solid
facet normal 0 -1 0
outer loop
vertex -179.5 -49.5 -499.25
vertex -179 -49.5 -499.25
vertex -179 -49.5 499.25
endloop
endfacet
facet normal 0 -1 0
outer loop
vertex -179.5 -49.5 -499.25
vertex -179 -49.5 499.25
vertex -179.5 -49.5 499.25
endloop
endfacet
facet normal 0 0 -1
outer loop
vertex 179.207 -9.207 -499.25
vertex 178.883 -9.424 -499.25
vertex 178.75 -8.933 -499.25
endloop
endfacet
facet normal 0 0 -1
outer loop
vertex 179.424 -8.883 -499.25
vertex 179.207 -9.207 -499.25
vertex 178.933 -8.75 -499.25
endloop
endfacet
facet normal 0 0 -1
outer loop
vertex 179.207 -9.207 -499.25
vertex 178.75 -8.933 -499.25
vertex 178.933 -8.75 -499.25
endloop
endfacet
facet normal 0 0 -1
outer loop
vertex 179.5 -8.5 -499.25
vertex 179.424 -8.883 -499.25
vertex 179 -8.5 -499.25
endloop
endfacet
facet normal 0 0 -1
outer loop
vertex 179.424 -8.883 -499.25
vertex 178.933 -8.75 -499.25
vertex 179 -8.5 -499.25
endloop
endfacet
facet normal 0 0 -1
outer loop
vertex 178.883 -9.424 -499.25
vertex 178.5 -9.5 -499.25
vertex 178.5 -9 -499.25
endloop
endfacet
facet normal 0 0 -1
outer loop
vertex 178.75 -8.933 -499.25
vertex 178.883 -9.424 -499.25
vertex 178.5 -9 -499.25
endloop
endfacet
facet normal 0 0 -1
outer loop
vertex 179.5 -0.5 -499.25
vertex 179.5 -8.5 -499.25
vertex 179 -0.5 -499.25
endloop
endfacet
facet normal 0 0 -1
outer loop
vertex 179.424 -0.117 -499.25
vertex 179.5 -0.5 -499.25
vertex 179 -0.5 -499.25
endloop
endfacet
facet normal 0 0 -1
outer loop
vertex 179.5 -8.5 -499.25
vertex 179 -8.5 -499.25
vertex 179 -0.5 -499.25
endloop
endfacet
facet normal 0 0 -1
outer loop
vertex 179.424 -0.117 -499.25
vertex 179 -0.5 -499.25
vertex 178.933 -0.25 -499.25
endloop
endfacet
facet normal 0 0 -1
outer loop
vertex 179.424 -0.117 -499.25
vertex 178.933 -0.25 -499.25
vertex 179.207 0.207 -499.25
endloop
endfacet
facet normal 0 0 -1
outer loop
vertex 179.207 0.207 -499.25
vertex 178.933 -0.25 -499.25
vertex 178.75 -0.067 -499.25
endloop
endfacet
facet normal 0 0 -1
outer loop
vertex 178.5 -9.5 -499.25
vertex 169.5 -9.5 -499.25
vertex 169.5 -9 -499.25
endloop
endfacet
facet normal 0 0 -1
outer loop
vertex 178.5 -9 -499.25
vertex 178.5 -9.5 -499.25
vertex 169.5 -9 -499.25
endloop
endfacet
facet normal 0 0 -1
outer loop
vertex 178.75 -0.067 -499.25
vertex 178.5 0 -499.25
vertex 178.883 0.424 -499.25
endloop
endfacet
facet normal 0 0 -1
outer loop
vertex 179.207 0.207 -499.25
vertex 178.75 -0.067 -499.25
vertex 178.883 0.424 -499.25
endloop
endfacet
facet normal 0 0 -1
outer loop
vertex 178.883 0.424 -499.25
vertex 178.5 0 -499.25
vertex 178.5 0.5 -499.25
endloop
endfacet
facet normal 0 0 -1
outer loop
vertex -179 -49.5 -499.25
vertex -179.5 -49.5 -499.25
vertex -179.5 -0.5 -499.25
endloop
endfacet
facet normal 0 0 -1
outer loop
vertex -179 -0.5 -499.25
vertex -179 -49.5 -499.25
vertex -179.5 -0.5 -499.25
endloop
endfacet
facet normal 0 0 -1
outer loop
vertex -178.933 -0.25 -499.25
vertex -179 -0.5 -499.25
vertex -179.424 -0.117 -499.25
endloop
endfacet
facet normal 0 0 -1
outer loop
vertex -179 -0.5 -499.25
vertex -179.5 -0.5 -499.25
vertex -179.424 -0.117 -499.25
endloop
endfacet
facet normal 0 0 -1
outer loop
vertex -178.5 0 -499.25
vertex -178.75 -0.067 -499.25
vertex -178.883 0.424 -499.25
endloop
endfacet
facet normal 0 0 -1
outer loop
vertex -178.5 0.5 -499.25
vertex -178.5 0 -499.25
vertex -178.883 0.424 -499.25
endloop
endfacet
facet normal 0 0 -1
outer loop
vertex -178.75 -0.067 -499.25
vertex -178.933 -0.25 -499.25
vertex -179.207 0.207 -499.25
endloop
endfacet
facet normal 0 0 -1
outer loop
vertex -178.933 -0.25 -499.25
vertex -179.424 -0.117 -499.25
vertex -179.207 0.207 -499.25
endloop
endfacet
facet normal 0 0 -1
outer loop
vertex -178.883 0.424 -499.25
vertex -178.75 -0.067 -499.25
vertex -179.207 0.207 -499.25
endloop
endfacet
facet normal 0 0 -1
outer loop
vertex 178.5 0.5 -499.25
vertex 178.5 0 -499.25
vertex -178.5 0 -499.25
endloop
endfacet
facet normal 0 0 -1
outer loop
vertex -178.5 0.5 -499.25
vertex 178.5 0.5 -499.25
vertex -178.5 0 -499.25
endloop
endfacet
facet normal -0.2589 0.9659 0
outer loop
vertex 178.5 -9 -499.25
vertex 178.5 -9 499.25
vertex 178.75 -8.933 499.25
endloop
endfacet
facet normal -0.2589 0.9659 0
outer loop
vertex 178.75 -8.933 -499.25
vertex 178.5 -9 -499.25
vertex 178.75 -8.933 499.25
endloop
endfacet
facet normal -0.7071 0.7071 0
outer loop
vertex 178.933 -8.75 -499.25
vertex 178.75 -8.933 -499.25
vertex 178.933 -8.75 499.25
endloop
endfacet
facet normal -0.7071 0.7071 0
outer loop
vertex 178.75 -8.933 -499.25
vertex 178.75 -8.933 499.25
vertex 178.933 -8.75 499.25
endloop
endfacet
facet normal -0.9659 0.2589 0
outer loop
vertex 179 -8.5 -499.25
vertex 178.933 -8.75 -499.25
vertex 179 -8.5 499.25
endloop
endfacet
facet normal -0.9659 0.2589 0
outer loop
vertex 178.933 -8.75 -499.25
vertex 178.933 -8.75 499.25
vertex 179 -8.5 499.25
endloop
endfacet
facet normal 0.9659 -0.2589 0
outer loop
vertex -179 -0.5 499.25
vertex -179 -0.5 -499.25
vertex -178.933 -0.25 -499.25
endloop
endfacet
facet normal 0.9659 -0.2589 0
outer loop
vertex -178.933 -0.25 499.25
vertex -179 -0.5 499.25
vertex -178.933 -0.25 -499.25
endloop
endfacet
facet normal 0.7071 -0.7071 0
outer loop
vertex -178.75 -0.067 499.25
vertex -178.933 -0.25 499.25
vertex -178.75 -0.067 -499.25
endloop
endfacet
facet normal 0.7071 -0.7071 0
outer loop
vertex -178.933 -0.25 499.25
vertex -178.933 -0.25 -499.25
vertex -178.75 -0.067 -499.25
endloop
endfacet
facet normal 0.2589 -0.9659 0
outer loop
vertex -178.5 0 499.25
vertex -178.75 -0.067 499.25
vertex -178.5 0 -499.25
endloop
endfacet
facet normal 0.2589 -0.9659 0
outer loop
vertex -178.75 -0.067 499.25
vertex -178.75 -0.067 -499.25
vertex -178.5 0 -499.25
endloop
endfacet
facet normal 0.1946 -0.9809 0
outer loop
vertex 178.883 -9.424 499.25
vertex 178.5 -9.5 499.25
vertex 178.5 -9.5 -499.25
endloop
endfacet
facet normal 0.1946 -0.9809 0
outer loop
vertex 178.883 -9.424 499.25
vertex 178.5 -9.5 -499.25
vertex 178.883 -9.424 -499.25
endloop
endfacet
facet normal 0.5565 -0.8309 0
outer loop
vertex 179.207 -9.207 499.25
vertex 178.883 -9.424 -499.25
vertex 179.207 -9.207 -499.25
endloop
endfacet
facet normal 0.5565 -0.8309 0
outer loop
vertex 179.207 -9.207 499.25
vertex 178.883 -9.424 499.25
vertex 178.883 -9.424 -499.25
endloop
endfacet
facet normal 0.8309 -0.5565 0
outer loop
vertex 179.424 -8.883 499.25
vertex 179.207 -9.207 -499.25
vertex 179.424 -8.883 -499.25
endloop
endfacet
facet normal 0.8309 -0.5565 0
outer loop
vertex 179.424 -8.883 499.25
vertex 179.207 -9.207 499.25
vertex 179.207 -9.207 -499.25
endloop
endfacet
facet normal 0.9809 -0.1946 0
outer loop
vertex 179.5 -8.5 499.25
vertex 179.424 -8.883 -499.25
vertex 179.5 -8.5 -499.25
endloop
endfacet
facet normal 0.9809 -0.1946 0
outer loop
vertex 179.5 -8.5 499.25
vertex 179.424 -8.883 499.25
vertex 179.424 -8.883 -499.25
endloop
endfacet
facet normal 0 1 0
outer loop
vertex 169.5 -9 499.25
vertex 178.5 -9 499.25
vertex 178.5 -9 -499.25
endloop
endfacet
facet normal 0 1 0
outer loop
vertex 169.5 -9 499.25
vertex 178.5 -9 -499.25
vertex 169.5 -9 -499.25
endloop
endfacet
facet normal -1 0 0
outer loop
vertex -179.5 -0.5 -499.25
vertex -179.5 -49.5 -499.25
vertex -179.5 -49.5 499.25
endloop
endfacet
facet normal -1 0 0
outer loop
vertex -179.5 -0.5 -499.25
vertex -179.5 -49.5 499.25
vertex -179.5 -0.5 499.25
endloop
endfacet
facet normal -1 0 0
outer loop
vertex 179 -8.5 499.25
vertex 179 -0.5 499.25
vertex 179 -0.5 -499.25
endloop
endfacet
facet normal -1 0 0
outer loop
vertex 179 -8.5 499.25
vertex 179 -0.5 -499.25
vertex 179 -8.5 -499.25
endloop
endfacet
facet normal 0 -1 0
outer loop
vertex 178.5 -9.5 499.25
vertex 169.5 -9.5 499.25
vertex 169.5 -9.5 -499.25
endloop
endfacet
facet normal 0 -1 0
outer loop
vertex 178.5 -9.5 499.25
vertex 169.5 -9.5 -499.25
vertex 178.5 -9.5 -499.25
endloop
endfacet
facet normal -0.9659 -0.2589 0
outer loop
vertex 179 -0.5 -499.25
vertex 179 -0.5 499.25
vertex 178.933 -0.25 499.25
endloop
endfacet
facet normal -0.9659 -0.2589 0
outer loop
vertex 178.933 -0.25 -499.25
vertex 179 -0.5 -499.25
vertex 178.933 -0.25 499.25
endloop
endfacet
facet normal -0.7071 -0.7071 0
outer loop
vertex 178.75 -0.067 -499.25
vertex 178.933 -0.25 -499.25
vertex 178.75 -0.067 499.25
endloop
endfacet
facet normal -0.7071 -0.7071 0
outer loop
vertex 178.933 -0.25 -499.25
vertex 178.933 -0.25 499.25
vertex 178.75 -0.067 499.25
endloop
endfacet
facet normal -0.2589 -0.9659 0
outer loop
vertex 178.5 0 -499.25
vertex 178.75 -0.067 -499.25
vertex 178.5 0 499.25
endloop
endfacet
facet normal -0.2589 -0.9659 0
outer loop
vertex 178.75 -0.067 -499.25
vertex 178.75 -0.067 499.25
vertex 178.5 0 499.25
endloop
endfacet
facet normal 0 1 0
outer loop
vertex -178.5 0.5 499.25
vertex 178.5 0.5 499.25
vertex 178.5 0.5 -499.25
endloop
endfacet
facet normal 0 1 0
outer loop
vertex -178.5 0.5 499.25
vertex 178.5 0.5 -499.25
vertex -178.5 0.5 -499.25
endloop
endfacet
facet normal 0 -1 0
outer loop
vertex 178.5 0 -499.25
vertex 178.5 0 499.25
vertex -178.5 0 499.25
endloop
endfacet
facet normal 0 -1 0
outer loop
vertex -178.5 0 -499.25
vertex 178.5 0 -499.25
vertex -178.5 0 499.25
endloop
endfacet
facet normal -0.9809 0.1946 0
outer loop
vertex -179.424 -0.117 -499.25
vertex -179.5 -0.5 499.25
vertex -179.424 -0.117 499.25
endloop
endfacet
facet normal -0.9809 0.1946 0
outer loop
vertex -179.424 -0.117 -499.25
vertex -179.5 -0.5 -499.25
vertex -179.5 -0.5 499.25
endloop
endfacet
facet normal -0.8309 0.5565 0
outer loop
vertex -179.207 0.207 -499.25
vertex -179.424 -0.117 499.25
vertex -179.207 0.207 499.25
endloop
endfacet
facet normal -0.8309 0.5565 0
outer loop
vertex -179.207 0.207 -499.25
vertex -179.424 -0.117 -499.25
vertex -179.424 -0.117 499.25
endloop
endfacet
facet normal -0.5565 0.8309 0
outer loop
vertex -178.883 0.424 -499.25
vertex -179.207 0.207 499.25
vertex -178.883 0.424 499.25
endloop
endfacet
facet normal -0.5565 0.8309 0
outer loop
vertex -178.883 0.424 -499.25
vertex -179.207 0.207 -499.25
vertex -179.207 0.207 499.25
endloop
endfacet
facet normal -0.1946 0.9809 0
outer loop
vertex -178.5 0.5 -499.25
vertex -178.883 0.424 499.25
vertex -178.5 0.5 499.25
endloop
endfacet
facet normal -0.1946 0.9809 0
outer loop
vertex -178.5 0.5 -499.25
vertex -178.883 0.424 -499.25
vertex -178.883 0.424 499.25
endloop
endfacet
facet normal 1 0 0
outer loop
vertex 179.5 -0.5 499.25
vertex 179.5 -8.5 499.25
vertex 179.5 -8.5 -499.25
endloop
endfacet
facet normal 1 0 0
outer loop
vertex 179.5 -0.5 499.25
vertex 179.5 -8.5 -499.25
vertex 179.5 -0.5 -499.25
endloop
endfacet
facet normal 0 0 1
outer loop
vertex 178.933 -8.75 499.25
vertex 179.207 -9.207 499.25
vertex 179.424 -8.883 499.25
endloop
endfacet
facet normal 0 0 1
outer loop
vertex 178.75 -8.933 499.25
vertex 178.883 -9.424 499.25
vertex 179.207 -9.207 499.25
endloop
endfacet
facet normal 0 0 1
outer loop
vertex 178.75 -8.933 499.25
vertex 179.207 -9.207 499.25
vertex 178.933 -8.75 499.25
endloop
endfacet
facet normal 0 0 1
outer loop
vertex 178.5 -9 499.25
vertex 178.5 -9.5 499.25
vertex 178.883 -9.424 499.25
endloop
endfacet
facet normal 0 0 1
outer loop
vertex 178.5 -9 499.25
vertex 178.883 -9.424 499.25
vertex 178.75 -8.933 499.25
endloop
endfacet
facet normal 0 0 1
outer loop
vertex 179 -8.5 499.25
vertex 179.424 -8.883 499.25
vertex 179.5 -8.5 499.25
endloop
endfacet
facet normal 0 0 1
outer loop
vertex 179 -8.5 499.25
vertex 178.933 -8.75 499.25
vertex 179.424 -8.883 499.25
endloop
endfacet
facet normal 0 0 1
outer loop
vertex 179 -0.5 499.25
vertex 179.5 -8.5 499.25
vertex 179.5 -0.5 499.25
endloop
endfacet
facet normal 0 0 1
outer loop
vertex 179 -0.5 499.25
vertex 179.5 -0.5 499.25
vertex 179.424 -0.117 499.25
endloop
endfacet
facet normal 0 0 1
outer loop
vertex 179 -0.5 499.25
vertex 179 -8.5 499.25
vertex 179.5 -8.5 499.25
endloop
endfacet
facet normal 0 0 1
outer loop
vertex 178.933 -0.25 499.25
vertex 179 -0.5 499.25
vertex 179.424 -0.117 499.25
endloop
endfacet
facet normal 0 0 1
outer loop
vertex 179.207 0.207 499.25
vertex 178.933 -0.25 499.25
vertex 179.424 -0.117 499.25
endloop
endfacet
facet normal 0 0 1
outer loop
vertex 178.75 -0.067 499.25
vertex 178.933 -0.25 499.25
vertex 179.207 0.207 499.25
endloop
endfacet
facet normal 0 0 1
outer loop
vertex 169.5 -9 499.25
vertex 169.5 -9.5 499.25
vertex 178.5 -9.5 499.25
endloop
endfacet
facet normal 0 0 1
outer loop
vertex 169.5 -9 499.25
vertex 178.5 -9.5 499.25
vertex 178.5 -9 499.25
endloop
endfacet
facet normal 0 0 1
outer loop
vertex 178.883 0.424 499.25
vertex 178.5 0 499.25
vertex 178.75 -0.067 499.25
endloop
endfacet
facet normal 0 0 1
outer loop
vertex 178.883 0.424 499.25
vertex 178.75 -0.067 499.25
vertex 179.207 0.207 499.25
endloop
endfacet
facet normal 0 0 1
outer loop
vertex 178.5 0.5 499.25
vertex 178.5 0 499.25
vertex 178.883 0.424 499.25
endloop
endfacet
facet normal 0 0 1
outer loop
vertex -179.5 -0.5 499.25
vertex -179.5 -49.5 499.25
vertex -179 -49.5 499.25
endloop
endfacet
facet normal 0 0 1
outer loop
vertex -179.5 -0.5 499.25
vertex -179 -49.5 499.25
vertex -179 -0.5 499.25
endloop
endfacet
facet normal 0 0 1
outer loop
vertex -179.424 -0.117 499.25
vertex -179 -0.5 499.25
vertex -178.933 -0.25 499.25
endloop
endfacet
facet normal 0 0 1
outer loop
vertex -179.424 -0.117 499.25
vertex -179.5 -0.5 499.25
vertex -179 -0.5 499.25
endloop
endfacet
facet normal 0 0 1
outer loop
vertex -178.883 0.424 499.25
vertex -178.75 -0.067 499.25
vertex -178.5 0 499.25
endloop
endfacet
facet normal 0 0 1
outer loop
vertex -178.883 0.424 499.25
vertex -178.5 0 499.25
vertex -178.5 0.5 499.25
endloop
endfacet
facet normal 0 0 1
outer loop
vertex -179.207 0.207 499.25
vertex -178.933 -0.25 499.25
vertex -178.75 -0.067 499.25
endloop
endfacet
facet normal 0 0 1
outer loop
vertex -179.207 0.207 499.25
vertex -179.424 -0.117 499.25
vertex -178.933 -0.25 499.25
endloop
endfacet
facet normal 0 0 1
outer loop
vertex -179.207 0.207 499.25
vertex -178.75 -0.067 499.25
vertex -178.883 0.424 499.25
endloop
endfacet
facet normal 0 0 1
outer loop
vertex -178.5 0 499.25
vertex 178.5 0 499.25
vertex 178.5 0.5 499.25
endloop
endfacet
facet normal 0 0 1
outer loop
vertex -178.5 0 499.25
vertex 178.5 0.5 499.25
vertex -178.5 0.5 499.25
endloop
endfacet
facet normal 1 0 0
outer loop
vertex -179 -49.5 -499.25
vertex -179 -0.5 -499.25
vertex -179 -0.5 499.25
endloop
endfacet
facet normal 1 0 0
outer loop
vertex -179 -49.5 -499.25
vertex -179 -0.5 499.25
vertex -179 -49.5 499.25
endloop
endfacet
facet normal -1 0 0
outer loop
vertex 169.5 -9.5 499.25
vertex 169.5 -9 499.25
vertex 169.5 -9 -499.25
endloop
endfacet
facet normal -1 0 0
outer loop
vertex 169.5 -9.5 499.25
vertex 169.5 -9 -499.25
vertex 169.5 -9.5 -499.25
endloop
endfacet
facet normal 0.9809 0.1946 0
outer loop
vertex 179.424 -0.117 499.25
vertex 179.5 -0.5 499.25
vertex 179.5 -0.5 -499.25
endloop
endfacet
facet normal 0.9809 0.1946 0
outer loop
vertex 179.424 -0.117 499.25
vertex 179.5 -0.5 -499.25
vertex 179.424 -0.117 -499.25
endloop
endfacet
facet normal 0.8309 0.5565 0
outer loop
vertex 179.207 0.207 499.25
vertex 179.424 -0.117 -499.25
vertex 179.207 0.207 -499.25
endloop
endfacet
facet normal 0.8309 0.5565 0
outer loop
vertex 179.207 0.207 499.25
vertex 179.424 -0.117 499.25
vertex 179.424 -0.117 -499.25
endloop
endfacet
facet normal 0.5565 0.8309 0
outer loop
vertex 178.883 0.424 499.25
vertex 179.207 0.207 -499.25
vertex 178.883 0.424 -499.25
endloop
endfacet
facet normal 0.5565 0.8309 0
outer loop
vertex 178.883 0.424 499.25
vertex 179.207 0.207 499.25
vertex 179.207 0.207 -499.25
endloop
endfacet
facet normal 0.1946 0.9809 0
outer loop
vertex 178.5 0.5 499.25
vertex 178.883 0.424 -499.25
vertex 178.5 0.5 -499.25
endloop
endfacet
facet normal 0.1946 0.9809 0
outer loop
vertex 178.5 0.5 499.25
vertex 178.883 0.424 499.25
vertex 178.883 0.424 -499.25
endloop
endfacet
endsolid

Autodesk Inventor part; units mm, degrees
ref_plane "YZ Plane" through (0, 0, 0) normal (1, 0, 0) x (0, 1, 0)
ref_plane "XZ Plane" through (0, 0, 0) normal (0, 1, 0) x (-1, 0, 0)
ref_plane "XY Plane" through (0, 0, 0) normal (0, 0, 1) x (1, 0, 0)
sketch "Sketch2" plane through (0, 0, 0) normal (0, 1, 0) x (-1, 0, 0)
  line L0 (-179.5, 499.25) -> (179.5, 499.25)
  line L1 (179.5, 499.25) -> (179.5, -499.25)
  line L2 (179.5, -499.25) -> (-179.5, -499.25)
  line L3 (-179.5, -499.25) -> (-179.5, 499.25)
  line L4 (-179.5, 499.25) -> (179.5, -499.25) construction
  line L5 (179.5, 499.25) -> (-179.5, -499.25) construction
  point P0 (0, 0)
  dimension "d2" = 359
  dimension "d3" = 998.5
extrude "Plate1" add sketch "Sketch2" along normal blind 0.5
sketch "Sketch3" plane through (-179, 0.5, -499.25) normal (-1, 0, 0) x (0, -1, 0)
  line L0 (0, 998.5) -> (0, 0)
  line L1 (0, 0) -> (50, 0)
  line L2 (50, 0) -> (50, 998.5)
  line L3 (50, 998.5) -> (0, 998.5)
edge flange "Flange1" height 50 angle 90 thickness 0.5 bend radius 0.5 thickness toward (-1, 0, 0) relief tear relief width 0.5 relief depth 0.25 edges at (-179.5, 0, 0) wall of the first edge with corners at (-179, 0.5, 499.25) (-179, 0.5, -499.25) (-179, -49.5, -499.25) (-179, -49.5, 499.25)
bend "Bend1"
corner "Corner1"
sketch "Sketch6" plane through (179, 0.5, 499.25) normal (1, 0, 0) x (0, 1, 0)
  line L0 (0, -998.5) -> (0, 0)
  line L1 (0, 0) -> (-10, 0)
  line L2 (-10, 0) -> (-10, -998.5)
  line L3 (-10, -998.5) -> (0, -998.5)
edge flange "Flange4" height 10 angle 90 thickness 0.5 bend radius 0.5 thickness toward (1, 0, 0) relief tear relief width 0.5 relief depth 0.25 edges at (179.5, 0, 0) wall of the first edge with corners at (179, 0.5, -499.25) (179, 0.5, 499.25) (179, -9.5, 499.25) (179, -9.5, -499.25)
bend "Bend4"
corner "Corner4"
sketch "Sketch7" plane through (179.5, -9, 499.25) normal (0, -1, 0) x (1, 0, 0)
  line L0 (0, -998.5) -> (0, 0)
  line L1 (0, 0) -> (-10, 0)
  line L2 (-10, 0) -> (-10, -998.5)
  line L3 (-10, -998.5) -> (0, -998.5)
edge flange "Flange5" height 10 angle 90 thickness 0.5 bend radius 0.5 thickness toward (0, -1, 0) relief tear relief width 0.5 relief depth 0.25 edges at (179, -9.5, 0) wall of the first edge with corners at (179.5, -9, -499.25) (179.5, -9, 499.25) (169.5, -9, 499.25) (169.5, -9, -499.25)
bend "Bend5"
corner "Corner5"
equation "\"d3\" = Ancho - 3 * Thickness"
equation "\"d4\" = Thickness"
equation "\"d5\" = BendReliefWidth"
equation "\"d6\" = BendReliefDepth"
equation "\"d7\" = MinimumRemnant"
equation "\"d8\" = TransitionRadius"
equation "\"d11\" = BendRadius"
equation "\"d12\" = CornerReliefSize"
equation "\"d13\" = GapSize"
equation "\"d14\" = JacobiRadiusSize"
equation "\"d35\" = BendReliefWidth"
equation "\"d36\" = BendReliefDepth"
equation "\"d37\" = MinimumRemnant"
equation "\"d38\" = TransitionRadius"
equation "\"d41\" = BendRadius"
equation "\"d42\" = CornerReliefSize"
equation "\"d43\" = GapSize"
equation "\"d44\" = JacobiRadiusSize"
equation "\"d45\" = BendReliefWidth"
equation "\"d46\" = BendReliefDepth"
equation "\"d47\" = MinimumRemnant"
equation "\"d48\" = TransitionRadius"
equation "\"d51\" = BendRadius"
equation "\"d52\" = CornerReliefSize"
equation "\"d53\" = GapSize"
equation "\"d54\" = JacobiRadiusSize"
equation "\"BendRadius\" = Thickness"
equation "\"BendReliefWidth\" = Thickness"
equation "\"BendReliefDepth\" = 0.5 * Thickness"
equation "\"CornerReliefSize\" = 4 * Thickness"
equation "\"MinimumRemnant\" = 2 * Thickness"
equation "\"TransitionRadius\" = BendRadius"
equation "\"JacobiRadiusSize\" = BendRadius"
equation "\"GapSize\" = Thickness"
equation "\"Space5\" = 0"
equation "\"Space6\" = 0"
equation "\"Space7\" = 0"
equation "\"Ancho\" = 1000"
equation "\"Thickness\" = 0.5"
properties part number "Divisor"
